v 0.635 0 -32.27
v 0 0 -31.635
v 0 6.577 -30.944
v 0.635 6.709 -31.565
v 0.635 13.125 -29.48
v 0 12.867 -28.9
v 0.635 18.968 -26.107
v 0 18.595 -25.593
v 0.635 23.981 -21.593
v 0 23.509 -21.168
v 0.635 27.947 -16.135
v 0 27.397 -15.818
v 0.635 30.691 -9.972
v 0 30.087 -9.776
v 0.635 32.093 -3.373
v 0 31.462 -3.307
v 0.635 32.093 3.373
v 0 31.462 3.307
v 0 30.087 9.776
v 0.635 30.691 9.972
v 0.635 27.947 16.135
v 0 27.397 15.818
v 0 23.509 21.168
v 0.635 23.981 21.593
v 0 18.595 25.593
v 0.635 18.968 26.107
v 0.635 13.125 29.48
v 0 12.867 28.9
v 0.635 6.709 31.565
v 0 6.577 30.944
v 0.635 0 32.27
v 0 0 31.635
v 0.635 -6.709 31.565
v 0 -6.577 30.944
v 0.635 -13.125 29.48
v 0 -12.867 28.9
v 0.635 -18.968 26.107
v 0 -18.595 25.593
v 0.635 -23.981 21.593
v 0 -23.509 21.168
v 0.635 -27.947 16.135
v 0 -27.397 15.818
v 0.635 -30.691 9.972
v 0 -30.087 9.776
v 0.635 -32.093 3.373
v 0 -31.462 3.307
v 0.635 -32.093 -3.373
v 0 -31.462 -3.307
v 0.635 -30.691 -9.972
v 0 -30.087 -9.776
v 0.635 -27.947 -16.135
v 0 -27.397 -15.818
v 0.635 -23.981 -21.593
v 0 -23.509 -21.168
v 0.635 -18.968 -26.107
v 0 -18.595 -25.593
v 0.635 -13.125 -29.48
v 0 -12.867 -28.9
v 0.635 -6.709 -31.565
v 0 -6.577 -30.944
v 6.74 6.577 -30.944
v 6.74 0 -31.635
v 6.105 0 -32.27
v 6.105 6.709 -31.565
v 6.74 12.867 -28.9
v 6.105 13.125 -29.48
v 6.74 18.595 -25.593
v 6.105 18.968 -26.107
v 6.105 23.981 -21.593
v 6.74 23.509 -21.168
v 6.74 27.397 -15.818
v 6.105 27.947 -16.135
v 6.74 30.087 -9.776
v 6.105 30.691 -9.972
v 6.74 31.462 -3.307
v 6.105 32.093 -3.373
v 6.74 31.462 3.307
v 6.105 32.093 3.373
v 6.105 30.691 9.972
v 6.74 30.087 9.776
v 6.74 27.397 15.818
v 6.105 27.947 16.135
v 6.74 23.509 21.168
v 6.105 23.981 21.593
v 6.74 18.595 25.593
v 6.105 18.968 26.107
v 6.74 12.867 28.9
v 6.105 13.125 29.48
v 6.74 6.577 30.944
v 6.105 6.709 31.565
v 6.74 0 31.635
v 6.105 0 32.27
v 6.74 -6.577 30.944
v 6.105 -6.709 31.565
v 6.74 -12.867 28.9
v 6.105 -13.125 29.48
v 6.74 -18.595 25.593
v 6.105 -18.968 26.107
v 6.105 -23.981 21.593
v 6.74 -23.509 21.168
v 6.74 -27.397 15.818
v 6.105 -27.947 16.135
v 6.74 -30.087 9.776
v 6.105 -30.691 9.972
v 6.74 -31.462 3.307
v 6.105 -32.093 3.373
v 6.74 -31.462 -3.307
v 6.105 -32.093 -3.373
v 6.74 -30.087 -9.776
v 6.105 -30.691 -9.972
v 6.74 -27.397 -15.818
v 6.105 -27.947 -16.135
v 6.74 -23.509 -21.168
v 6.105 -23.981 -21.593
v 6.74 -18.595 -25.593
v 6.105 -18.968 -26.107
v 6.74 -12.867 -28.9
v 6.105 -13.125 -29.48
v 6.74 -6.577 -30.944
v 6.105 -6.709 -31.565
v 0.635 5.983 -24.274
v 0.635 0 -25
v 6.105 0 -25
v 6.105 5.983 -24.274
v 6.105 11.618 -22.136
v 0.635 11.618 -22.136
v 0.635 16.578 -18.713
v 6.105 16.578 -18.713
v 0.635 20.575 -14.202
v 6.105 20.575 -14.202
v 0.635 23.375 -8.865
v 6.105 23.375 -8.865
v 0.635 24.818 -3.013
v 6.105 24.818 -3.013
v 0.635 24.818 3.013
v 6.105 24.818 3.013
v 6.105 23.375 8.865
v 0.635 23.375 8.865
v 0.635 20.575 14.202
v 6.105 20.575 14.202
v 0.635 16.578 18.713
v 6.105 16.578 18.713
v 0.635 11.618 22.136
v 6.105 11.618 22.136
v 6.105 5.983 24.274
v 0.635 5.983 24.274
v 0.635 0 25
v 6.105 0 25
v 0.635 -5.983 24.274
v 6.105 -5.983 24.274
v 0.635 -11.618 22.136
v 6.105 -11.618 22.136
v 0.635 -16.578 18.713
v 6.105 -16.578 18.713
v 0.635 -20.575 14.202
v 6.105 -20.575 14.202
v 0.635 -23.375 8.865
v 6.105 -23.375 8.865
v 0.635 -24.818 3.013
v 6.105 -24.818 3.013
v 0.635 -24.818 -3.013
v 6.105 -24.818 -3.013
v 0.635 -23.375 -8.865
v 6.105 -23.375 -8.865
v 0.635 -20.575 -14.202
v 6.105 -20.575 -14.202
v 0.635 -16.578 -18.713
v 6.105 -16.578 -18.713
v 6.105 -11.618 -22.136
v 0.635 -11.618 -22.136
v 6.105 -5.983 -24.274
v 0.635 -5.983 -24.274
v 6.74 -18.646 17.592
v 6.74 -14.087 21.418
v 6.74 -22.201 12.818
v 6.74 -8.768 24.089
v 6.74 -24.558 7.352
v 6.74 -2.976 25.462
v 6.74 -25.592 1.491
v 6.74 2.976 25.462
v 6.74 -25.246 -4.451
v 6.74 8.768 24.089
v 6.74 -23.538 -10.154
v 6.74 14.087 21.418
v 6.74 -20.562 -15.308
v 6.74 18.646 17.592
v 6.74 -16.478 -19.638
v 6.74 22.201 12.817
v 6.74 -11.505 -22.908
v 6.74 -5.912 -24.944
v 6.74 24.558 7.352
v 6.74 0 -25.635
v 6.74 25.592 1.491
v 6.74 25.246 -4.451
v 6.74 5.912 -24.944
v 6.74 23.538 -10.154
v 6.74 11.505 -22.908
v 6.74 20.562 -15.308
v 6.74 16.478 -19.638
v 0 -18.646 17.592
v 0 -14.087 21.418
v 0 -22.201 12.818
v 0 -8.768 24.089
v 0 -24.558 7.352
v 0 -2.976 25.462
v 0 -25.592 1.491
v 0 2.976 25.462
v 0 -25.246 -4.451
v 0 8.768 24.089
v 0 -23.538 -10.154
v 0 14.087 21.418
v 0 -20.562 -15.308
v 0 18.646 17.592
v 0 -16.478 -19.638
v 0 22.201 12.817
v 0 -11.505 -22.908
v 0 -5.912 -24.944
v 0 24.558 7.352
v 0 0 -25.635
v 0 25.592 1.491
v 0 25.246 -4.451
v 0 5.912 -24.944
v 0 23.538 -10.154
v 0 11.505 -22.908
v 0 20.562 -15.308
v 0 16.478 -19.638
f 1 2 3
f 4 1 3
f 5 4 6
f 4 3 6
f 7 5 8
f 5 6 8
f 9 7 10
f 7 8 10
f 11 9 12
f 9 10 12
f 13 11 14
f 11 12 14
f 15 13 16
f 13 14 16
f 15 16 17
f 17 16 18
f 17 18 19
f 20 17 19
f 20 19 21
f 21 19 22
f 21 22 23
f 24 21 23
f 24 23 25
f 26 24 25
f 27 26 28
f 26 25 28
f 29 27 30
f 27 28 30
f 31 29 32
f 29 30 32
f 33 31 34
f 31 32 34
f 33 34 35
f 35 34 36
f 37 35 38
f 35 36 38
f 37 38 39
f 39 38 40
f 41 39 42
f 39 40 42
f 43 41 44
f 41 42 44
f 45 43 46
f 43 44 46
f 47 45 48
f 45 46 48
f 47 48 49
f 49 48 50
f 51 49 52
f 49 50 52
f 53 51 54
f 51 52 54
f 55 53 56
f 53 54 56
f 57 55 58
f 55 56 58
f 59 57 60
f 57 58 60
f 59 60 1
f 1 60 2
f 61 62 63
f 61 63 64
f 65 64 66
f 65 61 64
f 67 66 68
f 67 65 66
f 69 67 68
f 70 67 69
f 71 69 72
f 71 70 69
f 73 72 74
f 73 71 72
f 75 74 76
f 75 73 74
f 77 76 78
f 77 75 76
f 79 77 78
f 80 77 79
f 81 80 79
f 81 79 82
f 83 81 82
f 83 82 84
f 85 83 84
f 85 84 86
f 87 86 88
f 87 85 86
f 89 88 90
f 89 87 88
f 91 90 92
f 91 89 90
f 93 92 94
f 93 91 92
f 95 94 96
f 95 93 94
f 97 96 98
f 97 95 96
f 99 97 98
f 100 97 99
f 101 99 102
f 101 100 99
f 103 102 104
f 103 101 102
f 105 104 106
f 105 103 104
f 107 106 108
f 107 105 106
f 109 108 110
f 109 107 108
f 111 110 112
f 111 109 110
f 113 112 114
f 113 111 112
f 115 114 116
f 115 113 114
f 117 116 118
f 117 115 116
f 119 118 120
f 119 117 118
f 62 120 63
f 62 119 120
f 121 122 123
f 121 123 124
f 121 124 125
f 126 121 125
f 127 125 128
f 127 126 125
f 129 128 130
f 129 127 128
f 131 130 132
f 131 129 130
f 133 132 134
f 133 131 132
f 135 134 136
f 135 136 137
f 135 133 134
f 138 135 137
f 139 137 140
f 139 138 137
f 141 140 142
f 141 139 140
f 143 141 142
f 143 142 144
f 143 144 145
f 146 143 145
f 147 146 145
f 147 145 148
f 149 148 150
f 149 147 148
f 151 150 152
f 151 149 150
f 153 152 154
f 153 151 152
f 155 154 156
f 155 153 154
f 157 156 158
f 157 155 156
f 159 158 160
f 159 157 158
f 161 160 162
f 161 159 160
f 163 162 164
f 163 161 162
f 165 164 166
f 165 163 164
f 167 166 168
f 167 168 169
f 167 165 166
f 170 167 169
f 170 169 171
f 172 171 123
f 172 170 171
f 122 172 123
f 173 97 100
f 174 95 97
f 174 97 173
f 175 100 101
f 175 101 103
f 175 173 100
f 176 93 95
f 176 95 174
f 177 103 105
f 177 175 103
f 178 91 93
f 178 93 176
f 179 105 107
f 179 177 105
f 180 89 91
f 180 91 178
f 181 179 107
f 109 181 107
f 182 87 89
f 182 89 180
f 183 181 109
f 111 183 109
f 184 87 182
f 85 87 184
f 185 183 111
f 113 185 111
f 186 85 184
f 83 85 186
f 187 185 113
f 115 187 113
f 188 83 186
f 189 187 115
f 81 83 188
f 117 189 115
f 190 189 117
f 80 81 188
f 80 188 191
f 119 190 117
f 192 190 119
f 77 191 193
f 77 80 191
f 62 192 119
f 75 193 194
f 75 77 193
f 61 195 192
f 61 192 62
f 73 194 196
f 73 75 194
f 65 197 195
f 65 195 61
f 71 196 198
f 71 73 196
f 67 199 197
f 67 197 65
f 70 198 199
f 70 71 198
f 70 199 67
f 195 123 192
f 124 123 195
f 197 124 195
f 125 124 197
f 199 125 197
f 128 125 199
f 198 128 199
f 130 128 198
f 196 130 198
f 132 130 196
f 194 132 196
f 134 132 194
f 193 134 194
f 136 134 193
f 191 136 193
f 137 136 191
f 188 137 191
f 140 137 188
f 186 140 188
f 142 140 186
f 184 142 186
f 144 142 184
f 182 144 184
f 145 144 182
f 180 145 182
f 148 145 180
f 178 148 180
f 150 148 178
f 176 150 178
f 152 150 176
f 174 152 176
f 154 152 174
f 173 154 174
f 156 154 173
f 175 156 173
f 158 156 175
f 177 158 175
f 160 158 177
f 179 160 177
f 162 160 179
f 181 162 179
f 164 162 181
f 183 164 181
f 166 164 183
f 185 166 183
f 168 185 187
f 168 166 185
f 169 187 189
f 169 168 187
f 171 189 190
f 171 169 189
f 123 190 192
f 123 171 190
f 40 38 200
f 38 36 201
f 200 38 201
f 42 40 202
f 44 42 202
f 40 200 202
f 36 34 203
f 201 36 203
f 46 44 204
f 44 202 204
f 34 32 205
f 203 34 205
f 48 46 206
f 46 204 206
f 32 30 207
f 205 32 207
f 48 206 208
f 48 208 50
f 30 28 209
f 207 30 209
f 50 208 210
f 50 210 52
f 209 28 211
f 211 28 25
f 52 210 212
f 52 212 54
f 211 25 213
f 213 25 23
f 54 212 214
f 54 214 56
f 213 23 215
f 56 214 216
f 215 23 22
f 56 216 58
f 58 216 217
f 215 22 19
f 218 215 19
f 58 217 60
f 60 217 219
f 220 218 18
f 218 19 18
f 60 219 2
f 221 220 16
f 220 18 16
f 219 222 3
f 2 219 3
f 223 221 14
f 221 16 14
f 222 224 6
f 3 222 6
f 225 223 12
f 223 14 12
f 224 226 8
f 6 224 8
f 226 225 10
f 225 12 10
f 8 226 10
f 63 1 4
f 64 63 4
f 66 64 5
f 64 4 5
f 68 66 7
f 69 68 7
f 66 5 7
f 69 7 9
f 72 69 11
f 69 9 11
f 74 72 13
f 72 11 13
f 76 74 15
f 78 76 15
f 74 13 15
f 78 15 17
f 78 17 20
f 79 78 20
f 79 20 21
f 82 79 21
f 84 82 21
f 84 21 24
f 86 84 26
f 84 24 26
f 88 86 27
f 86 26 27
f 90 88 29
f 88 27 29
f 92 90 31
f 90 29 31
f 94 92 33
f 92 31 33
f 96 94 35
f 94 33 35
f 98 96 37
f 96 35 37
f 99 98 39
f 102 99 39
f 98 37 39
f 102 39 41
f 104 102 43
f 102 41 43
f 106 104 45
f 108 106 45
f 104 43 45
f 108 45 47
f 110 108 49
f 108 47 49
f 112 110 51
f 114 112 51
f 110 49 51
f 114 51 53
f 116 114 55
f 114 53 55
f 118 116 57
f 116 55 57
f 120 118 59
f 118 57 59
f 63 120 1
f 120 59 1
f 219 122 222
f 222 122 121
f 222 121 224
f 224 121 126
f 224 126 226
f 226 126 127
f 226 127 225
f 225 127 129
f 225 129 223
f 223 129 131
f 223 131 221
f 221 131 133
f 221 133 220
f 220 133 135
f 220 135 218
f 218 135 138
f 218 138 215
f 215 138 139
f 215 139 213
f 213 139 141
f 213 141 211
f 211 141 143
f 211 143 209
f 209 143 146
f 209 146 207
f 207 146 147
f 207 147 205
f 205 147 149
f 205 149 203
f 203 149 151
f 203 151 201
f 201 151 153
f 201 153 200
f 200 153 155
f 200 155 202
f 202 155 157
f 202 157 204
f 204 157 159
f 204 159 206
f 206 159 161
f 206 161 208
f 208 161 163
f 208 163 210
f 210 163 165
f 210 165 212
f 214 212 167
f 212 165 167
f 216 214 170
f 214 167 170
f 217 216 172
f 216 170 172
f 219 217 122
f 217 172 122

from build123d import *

# Parameters (mm, degrees)
SKETCH1_R           = 32.27
SKETCH1_R_2         = 25
BOSS_EXTRUDE1_DEPTH = 6.74
CHAMFER1_SIZE       = 0.635
CHAMFER2_SIZE       = 0.635


with BuildPart() as part:
    # Sketch1 → Boss-Extrude1 (new body)
    with BuildSketch(Plane(origin=(0, 0, 0), x_dir=(0, 0, -1), z_dir=(1, 0, 0))):
        Circle(SKETCH1_R)
        Circle(SKETCH1_R_2, mode=Mode.SUBTRACT)
    extrude(amount=BOSS_EXTRUDE1_DEPTH)

    # Chamfer1
    chamfer1_edges = [part.edges().sort_by_distance(p)[0] for p in [
        (0, 0, 32.27),
        (6.74, 0, 32.27),
    ]]
    chamfer(chamfer1_edges, length=CHAMFER1_SIZE)

    # Chamfer2
    chamfer2_edges = [part.edges().sort_by_distance(p)[0] for p in [
        (0, 0, 25),
        (6.74, 0, 25),
    ]]
    chamfer(chamfer2_edges, length=CHAMFER2_SIZE)


solid = part.part
